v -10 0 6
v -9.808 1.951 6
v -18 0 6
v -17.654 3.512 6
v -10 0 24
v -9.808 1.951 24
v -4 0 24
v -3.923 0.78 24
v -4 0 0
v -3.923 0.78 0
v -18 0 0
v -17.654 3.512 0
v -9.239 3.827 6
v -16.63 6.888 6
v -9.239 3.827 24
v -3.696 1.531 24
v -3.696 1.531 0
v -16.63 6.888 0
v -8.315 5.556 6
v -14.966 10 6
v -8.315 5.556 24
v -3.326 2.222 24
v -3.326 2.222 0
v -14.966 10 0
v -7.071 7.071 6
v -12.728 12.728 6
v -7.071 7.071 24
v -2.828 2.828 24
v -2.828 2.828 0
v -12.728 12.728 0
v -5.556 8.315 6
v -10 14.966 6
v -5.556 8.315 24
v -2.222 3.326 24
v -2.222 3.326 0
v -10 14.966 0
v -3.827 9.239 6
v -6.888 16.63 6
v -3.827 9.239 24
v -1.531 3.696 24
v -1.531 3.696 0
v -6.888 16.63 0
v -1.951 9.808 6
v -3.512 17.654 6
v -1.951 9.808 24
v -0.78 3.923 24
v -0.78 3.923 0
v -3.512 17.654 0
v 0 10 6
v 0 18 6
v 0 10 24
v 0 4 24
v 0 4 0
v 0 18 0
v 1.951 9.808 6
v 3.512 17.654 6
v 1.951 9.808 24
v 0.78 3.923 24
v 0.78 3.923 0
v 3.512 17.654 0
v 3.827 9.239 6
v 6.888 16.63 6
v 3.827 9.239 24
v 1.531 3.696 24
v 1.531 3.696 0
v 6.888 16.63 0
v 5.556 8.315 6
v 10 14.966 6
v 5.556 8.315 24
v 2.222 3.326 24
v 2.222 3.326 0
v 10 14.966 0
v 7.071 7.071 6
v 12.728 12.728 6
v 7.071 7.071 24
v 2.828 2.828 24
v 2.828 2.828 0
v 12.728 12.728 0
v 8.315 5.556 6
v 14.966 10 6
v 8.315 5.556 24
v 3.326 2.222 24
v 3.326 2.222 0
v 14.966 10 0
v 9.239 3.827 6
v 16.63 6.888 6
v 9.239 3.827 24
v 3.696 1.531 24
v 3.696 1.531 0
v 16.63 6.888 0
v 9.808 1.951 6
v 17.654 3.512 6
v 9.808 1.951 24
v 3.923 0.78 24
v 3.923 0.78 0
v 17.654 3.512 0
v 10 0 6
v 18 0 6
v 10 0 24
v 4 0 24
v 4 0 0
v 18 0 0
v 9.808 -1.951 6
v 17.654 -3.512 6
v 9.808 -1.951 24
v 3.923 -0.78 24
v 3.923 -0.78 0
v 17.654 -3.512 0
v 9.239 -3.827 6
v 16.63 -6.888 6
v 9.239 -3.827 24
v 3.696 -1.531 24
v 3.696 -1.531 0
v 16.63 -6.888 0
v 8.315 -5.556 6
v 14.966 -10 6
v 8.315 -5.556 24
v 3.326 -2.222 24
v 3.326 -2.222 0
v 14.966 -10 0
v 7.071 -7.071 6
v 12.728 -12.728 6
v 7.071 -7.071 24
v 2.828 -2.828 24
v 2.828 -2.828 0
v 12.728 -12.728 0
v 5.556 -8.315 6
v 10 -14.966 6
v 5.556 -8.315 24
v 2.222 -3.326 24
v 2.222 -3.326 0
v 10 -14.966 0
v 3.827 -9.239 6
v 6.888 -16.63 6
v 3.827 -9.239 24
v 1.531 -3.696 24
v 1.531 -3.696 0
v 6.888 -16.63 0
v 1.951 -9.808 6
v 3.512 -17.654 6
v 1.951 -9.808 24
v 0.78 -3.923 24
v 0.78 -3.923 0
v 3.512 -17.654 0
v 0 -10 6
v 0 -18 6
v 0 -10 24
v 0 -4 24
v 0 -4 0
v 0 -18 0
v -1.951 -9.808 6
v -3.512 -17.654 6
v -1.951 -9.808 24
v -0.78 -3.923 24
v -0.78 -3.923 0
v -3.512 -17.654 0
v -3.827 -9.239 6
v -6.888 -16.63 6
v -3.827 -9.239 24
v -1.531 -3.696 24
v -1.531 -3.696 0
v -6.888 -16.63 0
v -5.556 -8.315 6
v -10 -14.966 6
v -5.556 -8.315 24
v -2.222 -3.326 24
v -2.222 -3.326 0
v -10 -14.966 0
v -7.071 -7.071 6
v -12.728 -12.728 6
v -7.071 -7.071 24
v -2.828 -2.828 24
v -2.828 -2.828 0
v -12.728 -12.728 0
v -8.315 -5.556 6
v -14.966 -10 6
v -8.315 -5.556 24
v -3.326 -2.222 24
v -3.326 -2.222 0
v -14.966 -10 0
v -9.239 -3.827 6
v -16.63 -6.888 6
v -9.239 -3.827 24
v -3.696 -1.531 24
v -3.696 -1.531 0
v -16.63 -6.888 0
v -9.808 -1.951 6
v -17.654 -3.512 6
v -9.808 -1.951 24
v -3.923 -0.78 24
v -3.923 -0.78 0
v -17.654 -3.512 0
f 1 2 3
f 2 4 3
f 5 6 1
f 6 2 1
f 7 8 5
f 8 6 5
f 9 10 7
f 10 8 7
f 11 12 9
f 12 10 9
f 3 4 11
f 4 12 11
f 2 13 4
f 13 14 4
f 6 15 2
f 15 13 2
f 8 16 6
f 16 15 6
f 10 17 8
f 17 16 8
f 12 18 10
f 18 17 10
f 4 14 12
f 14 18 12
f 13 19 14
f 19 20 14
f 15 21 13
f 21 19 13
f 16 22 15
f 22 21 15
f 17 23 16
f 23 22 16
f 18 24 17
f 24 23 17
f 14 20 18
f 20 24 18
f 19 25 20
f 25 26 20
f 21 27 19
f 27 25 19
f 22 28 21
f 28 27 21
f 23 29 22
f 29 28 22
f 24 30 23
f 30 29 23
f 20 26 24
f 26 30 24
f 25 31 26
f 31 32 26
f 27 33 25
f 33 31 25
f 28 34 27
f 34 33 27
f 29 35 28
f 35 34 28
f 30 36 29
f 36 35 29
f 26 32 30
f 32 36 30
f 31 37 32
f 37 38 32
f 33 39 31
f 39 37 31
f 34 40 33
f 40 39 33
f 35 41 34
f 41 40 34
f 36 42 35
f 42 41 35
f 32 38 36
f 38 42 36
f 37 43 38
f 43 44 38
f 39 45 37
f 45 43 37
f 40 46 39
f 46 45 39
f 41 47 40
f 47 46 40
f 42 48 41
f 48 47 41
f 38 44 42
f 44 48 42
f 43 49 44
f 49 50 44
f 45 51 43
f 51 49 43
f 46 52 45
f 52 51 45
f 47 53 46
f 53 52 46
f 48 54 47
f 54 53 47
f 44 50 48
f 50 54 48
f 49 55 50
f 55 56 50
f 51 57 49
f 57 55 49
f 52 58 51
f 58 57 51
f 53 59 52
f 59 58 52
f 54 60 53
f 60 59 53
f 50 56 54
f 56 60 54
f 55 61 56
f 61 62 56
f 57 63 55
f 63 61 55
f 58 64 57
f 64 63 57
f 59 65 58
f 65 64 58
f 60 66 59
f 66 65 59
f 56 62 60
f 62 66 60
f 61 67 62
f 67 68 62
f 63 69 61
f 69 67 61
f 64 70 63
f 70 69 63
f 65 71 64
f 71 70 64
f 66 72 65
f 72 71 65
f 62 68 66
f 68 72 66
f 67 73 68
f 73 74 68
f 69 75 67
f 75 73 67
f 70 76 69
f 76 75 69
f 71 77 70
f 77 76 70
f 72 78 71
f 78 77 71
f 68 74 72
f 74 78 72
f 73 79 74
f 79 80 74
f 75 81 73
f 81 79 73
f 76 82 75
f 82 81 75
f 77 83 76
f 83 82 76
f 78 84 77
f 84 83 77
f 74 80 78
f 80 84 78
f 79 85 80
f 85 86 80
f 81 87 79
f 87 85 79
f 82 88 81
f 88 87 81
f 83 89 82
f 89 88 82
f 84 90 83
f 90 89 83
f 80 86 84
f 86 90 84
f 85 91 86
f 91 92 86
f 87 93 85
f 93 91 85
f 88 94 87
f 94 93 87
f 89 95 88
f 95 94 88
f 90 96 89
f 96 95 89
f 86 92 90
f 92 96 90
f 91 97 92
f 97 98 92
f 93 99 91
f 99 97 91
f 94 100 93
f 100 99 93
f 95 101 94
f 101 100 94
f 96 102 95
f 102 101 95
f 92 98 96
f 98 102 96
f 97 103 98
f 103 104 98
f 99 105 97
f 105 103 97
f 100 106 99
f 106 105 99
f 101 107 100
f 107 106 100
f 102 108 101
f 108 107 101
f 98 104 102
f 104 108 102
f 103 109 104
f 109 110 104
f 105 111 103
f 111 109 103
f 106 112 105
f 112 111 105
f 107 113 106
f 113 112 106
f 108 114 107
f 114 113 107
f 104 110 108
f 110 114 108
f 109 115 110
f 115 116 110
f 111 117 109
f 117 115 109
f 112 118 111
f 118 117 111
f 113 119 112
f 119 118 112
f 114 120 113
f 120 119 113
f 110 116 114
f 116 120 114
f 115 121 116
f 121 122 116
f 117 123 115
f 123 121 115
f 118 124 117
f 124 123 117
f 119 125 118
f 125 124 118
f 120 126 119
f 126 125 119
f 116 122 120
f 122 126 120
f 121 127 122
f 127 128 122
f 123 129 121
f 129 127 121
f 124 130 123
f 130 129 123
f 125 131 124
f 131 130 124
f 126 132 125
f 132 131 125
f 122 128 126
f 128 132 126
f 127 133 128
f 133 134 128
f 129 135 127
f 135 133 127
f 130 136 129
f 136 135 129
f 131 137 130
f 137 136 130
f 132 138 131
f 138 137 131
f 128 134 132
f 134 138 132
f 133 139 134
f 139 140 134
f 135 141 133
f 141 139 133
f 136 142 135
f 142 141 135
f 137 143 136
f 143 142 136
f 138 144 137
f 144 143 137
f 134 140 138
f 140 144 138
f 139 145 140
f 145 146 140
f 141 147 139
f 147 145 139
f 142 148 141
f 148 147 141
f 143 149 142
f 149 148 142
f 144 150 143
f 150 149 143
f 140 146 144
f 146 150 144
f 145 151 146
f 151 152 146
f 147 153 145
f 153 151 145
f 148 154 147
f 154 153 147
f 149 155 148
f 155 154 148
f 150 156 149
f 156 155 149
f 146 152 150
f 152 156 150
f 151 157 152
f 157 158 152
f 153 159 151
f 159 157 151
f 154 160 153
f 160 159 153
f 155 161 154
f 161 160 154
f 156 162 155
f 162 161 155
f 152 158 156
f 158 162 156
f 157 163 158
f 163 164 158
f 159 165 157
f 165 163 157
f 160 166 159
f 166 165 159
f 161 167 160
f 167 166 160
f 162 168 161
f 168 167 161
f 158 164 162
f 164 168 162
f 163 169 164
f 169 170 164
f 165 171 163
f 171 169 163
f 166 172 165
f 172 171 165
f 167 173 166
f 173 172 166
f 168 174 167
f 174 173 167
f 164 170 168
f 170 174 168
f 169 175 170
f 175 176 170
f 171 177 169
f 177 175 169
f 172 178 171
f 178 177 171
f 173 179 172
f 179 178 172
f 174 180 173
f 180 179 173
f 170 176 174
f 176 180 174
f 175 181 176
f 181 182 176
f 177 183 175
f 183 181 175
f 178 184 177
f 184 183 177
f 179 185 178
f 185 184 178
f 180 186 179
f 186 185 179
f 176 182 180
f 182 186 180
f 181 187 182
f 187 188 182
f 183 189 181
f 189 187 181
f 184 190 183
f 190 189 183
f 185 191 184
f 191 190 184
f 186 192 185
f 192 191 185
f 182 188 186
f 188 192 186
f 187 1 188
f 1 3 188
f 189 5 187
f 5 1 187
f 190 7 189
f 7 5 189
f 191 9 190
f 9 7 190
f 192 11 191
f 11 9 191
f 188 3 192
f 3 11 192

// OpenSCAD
$fn = 32;

// ----------------------------------------------------------------------
// Revolved part: flanged bushing R18
// ----------------------------------------------------------------------

// --- parameters (mm) ---
bore_r = 4;               // bore radius
flange_r = 18;            // flange radius
flange_h = 6;             // flange thickness
sleeve_r = 10;            // sleeve radius
total_h = 24;             // overall height
revolve_angle = 360;      // revolve sweep, degrees

bore_d = 2 * bore_r;
flange_d = 2 * flange_r;
sleeve_d = 2 * sleeve_r;

profile = [[4, 0], [18, 0], [18, 6], [10, 6], [10, 24], [4, 24]];  // primary outline, 6 points, counter clockwise

// --- the one profile operation ---
rotate_extrude(angle = revolve_angle) polygon(points = profile);
